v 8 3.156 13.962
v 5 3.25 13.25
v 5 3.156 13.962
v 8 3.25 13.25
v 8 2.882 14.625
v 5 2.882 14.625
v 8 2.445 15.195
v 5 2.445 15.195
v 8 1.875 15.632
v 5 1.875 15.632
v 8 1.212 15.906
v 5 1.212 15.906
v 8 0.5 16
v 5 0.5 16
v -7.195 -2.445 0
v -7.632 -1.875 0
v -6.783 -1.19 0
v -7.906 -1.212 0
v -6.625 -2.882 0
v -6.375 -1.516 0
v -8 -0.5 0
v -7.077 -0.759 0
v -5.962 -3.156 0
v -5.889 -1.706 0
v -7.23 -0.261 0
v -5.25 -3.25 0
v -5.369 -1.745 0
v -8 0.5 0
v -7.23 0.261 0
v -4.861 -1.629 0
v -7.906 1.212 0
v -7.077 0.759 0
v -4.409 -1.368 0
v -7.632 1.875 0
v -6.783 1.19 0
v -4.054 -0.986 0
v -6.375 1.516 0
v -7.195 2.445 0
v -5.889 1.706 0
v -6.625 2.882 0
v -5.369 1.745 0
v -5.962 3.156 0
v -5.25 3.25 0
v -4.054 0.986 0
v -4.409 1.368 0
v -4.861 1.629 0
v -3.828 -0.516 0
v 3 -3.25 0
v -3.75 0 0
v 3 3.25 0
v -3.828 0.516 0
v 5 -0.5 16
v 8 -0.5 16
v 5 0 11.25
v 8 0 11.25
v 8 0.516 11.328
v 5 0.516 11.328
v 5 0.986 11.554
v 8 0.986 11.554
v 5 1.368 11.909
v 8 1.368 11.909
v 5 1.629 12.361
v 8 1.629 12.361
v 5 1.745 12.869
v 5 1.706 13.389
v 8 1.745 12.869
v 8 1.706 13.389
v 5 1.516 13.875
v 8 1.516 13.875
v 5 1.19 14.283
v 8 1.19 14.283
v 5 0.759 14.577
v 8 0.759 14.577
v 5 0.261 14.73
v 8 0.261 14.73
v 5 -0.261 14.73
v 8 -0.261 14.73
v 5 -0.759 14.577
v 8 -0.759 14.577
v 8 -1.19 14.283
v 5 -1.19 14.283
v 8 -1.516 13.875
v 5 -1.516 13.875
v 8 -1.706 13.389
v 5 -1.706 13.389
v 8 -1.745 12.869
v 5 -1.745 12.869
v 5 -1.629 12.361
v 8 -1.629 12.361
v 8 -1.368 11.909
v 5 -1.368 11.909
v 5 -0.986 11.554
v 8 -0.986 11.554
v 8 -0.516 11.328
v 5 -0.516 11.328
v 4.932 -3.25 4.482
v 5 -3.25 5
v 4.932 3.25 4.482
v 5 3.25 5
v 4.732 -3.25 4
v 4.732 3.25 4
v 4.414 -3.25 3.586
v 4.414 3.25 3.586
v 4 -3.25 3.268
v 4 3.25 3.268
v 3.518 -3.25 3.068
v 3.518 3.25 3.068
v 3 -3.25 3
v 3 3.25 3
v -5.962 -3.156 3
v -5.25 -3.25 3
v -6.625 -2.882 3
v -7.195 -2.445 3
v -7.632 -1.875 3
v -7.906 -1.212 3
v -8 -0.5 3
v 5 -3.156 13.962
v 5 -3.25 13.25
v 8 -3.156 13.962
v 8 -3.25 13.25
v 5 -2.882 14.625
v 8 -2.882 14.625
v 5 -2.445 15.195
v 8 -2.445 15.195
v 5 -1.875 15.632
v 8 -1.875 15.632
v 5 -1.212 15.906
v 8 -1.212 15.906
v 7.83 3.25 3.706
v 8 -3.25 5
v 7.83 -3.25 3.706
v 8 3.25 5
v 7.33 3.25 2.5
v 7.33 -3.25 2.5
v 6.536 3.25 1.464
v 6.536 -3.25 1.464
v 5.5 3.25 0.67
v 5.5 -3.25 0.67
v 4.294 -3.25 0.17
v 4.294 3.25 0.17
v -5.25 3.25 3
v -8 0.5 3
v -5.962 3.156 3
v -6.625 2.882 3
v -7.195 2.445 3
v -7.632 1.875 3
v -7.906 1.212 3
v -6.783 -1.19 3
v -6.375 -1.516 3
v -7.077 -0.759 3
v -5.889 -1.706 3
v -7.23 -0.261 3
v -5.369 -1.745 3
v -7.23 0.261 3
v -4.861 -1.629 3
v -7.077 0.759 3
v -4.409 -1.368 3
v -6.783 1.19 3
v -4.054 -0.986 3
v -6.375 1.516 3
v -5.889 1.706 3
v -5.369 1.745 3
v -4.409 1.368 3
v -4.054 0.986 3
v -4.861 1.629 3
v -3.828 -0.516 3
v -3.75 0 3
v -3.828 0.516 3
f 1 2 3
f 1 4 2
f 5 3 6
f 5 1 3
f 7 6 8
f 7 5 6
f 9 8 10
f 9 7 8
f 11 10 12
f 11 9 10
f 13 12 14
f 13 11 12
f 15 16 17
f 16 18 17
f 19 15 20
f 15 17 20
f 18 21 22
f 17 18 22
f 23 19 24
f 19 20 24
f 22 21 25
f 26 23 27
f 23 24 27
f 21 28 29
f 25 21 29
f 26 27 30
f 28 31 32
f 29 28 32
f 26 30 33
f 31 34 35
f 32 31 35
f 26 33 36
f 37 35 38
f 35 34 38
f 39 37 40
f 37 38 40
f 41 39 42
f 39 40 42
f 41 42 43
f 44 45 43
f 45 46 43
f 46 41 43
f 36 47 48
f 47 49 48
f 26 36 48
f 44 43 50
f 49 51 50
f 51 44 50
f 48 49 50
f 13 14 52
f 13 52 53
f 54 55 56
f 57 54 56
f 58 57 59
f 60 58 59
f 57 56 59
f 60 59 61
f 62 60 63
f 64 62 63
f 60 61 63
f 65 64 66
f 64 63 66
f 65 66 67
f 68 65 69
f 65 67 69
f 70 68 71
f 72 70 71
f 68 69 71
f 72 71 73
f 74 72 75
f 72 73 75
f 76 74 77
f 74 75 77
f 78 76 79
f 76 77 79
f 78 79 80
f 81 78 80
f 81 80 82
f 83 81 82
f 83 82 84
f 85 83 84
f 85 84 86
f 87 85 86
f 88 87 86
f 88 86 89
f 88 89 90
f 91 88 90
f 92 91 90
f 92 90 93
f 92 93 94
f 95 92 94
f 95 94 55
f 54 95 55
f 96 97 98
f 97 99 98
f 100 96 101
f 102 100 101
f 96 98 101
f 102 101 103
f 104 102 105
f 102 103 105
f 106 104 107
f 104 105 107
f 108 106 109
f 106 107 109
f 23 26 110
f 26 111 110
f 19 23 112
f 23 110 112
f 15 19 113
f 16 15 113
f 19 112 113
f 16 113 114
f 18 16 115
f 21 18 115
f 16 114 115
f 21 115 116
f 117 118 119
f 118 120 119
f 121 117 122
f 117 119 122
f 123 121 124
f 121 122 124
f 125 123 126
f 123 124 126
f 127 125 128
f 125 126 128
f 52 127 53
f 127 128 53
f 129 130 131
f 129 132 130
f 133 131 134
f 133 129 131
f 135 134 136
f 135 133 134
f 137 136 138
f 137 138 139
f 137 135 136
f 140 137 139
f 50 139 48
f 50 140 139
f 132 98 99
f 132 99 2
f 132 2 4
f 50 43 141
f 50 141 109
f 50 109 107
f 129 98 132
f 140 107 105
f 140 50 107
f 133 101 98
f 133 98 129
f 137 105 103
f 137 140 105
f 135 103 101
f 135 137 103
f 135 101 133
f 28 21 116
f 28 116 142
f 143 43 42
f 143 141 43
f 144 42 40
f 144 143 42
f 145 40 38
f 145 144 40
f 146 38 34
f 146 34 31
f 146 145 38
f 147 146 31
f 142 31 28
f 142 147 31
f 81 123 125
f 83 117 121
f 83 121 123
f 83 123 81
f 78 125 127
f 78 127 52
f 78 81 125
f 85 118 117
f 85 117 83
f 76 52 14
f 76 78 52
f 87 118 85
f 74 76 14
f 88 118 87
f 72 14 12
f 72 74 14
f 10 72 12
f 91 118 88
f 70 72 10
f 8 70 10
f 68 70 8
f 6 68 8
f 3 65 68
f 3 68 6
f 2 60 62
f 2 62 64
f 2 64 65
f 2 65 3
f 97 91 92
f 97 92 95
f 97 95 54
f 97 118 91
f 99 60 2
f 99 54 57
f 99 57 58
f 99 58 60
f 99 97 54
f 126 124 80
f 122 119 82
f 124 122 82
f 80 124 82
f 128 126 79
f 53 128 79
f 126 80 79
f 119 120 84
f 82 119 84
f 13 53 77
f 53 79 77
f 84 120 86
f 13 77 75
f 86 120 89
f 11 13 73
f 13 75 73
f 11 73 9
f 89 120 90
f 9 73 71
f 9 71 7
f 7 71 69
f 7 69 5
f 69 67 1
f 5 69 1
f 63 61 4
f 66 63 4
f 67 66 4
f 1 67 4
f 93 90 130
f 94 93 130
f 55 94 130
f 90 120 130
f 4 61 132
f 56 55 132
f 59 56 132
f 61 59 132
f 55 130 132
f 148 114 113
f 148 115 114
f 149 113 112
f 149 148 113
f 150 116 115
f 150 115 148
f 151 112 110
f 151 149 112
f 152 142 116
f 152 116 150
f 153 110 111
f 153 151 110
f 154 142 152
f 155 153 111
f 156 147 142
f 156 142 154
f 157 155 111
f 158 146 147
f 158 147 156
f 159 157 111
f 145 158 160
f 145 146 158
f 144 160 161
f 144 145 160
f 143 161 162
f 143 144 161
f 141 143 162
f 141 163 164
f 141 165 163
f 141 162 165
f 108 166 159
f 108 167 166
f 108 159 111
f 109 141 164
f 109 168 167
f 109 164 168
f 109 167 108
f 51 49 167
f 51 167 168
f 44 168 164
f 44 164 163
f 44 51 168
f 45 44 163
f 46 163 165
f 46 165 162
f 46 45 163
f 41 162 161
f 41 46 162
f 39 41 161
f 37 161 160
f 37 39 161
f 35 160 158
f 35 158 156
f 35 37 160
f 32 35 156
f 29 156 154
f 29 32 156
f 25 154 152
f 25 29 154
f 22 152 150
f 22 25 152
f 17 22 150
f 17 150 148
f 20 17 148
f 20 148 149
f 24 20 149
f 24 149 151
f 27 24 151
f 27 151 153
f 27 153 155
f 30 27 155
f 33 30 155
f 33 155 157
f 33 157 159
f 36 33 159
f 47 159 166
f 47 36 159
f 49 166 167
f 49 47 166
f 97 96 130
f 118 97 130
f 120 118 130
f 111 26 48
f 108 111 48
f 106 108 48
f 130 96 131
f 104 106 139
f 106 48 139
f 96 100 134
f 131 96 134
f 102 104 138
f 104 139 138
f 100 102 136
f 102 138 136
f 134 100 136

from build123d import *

# Parameters (mm, degrees)
ESQUISSE1_W             = 13
ESQUISSE1_H             = 6.5
ESQUISSE1_R             = 1.75
BOSS_EXTRU_1_DEPTH      = 3
ESQUISSE1_3_W           = 3
ESQUISSE1_3_H           = 6.5
BOSS_EXTRU_2_DEPTH      = 16
ENL_V_MAT_EXTRU_1_REACH = 24.86
ESQUISSE2_R             = 1.75
CONG_1_R                = 2.75
CONG_2_R                = 2
CONG_3_R                = 5


with BuildPart() as part:
    # Esquisse1 → Boss.-Extru.1 (new body)
    with BuildSketch(Plane.XY):
        with Locations((-1.5, 0)):
            Rectangle(ESQUISSE1_W, ESQUISSE1_H)
        with Locations((-5.5, 0)):
            Circle(ESQUISSE1_R, mode=Mode.SUBTRACT)
    extrude(amount=BOSS_EXTRU_1_DEPTH)

    # Esquisse1<3> → Boss.-Extru.2 (add)
    with BuildSketch(Plane.XY):
        with Locations((6.5, 0)):
            Rectangle(ESQUISSE1_3_W, ESQUISSE1_3_H)
    extrude(amount=BOSS_EXTRU_2_DEPTH)

    # Esquisse2 → Enlèv. mat.-Extru.1 (cut, up to next)
    with BuildSketch(Plane(origin=(8, 0, 0), x_dir=(0, 0, -1), z_dir=(1, 0, 0)), mode=Mode.PRIVATE) as enl_v_mat_extru_1_sk1:
        with Locations((-13, 0)):
            Circle(ESQUISSE2_R)
    enl_v_mat_extru_1_tool1 = extrude(enl_v_mat_extru_1_sk1.sketch, amount=-ENL_V_MAT_EXTRU_1_REACH, mode=Mode.PRIVATE) & part.part
    add(enl_v_mat_extru_1_tool1.solids().sort_by_distance((8, 0, 13))[0], mode=Mode.SUBTRACT)

    # Congé1
    cong_1_edges = [part.edges().sort_by_distance(p)[0] for p in [
        (6.5, -3.25, 16),
        (6.5, 3.25, 16),
        (-8, -3.25, 1.5),
        (-8, 3.25, 1.5),
    ]]
    fillet(cong_1_edges, radius=CONG_1_R)

    # Congé2
    cong_2_edges = [part.edges().sort_by_distance(p)[0] for p in [
        (5, 0, 3),
    ]]
    fillet(cong_2_edges, radius=CONG_2_R)

    # Congé3
    cong_3_edges = [part.edges().sort_by_distance(p)[0] for p in [
        (8, 0, 0),
    ]]
    fillet(cong_3_edges, radius=CONG_3_R)


solid = part.part
